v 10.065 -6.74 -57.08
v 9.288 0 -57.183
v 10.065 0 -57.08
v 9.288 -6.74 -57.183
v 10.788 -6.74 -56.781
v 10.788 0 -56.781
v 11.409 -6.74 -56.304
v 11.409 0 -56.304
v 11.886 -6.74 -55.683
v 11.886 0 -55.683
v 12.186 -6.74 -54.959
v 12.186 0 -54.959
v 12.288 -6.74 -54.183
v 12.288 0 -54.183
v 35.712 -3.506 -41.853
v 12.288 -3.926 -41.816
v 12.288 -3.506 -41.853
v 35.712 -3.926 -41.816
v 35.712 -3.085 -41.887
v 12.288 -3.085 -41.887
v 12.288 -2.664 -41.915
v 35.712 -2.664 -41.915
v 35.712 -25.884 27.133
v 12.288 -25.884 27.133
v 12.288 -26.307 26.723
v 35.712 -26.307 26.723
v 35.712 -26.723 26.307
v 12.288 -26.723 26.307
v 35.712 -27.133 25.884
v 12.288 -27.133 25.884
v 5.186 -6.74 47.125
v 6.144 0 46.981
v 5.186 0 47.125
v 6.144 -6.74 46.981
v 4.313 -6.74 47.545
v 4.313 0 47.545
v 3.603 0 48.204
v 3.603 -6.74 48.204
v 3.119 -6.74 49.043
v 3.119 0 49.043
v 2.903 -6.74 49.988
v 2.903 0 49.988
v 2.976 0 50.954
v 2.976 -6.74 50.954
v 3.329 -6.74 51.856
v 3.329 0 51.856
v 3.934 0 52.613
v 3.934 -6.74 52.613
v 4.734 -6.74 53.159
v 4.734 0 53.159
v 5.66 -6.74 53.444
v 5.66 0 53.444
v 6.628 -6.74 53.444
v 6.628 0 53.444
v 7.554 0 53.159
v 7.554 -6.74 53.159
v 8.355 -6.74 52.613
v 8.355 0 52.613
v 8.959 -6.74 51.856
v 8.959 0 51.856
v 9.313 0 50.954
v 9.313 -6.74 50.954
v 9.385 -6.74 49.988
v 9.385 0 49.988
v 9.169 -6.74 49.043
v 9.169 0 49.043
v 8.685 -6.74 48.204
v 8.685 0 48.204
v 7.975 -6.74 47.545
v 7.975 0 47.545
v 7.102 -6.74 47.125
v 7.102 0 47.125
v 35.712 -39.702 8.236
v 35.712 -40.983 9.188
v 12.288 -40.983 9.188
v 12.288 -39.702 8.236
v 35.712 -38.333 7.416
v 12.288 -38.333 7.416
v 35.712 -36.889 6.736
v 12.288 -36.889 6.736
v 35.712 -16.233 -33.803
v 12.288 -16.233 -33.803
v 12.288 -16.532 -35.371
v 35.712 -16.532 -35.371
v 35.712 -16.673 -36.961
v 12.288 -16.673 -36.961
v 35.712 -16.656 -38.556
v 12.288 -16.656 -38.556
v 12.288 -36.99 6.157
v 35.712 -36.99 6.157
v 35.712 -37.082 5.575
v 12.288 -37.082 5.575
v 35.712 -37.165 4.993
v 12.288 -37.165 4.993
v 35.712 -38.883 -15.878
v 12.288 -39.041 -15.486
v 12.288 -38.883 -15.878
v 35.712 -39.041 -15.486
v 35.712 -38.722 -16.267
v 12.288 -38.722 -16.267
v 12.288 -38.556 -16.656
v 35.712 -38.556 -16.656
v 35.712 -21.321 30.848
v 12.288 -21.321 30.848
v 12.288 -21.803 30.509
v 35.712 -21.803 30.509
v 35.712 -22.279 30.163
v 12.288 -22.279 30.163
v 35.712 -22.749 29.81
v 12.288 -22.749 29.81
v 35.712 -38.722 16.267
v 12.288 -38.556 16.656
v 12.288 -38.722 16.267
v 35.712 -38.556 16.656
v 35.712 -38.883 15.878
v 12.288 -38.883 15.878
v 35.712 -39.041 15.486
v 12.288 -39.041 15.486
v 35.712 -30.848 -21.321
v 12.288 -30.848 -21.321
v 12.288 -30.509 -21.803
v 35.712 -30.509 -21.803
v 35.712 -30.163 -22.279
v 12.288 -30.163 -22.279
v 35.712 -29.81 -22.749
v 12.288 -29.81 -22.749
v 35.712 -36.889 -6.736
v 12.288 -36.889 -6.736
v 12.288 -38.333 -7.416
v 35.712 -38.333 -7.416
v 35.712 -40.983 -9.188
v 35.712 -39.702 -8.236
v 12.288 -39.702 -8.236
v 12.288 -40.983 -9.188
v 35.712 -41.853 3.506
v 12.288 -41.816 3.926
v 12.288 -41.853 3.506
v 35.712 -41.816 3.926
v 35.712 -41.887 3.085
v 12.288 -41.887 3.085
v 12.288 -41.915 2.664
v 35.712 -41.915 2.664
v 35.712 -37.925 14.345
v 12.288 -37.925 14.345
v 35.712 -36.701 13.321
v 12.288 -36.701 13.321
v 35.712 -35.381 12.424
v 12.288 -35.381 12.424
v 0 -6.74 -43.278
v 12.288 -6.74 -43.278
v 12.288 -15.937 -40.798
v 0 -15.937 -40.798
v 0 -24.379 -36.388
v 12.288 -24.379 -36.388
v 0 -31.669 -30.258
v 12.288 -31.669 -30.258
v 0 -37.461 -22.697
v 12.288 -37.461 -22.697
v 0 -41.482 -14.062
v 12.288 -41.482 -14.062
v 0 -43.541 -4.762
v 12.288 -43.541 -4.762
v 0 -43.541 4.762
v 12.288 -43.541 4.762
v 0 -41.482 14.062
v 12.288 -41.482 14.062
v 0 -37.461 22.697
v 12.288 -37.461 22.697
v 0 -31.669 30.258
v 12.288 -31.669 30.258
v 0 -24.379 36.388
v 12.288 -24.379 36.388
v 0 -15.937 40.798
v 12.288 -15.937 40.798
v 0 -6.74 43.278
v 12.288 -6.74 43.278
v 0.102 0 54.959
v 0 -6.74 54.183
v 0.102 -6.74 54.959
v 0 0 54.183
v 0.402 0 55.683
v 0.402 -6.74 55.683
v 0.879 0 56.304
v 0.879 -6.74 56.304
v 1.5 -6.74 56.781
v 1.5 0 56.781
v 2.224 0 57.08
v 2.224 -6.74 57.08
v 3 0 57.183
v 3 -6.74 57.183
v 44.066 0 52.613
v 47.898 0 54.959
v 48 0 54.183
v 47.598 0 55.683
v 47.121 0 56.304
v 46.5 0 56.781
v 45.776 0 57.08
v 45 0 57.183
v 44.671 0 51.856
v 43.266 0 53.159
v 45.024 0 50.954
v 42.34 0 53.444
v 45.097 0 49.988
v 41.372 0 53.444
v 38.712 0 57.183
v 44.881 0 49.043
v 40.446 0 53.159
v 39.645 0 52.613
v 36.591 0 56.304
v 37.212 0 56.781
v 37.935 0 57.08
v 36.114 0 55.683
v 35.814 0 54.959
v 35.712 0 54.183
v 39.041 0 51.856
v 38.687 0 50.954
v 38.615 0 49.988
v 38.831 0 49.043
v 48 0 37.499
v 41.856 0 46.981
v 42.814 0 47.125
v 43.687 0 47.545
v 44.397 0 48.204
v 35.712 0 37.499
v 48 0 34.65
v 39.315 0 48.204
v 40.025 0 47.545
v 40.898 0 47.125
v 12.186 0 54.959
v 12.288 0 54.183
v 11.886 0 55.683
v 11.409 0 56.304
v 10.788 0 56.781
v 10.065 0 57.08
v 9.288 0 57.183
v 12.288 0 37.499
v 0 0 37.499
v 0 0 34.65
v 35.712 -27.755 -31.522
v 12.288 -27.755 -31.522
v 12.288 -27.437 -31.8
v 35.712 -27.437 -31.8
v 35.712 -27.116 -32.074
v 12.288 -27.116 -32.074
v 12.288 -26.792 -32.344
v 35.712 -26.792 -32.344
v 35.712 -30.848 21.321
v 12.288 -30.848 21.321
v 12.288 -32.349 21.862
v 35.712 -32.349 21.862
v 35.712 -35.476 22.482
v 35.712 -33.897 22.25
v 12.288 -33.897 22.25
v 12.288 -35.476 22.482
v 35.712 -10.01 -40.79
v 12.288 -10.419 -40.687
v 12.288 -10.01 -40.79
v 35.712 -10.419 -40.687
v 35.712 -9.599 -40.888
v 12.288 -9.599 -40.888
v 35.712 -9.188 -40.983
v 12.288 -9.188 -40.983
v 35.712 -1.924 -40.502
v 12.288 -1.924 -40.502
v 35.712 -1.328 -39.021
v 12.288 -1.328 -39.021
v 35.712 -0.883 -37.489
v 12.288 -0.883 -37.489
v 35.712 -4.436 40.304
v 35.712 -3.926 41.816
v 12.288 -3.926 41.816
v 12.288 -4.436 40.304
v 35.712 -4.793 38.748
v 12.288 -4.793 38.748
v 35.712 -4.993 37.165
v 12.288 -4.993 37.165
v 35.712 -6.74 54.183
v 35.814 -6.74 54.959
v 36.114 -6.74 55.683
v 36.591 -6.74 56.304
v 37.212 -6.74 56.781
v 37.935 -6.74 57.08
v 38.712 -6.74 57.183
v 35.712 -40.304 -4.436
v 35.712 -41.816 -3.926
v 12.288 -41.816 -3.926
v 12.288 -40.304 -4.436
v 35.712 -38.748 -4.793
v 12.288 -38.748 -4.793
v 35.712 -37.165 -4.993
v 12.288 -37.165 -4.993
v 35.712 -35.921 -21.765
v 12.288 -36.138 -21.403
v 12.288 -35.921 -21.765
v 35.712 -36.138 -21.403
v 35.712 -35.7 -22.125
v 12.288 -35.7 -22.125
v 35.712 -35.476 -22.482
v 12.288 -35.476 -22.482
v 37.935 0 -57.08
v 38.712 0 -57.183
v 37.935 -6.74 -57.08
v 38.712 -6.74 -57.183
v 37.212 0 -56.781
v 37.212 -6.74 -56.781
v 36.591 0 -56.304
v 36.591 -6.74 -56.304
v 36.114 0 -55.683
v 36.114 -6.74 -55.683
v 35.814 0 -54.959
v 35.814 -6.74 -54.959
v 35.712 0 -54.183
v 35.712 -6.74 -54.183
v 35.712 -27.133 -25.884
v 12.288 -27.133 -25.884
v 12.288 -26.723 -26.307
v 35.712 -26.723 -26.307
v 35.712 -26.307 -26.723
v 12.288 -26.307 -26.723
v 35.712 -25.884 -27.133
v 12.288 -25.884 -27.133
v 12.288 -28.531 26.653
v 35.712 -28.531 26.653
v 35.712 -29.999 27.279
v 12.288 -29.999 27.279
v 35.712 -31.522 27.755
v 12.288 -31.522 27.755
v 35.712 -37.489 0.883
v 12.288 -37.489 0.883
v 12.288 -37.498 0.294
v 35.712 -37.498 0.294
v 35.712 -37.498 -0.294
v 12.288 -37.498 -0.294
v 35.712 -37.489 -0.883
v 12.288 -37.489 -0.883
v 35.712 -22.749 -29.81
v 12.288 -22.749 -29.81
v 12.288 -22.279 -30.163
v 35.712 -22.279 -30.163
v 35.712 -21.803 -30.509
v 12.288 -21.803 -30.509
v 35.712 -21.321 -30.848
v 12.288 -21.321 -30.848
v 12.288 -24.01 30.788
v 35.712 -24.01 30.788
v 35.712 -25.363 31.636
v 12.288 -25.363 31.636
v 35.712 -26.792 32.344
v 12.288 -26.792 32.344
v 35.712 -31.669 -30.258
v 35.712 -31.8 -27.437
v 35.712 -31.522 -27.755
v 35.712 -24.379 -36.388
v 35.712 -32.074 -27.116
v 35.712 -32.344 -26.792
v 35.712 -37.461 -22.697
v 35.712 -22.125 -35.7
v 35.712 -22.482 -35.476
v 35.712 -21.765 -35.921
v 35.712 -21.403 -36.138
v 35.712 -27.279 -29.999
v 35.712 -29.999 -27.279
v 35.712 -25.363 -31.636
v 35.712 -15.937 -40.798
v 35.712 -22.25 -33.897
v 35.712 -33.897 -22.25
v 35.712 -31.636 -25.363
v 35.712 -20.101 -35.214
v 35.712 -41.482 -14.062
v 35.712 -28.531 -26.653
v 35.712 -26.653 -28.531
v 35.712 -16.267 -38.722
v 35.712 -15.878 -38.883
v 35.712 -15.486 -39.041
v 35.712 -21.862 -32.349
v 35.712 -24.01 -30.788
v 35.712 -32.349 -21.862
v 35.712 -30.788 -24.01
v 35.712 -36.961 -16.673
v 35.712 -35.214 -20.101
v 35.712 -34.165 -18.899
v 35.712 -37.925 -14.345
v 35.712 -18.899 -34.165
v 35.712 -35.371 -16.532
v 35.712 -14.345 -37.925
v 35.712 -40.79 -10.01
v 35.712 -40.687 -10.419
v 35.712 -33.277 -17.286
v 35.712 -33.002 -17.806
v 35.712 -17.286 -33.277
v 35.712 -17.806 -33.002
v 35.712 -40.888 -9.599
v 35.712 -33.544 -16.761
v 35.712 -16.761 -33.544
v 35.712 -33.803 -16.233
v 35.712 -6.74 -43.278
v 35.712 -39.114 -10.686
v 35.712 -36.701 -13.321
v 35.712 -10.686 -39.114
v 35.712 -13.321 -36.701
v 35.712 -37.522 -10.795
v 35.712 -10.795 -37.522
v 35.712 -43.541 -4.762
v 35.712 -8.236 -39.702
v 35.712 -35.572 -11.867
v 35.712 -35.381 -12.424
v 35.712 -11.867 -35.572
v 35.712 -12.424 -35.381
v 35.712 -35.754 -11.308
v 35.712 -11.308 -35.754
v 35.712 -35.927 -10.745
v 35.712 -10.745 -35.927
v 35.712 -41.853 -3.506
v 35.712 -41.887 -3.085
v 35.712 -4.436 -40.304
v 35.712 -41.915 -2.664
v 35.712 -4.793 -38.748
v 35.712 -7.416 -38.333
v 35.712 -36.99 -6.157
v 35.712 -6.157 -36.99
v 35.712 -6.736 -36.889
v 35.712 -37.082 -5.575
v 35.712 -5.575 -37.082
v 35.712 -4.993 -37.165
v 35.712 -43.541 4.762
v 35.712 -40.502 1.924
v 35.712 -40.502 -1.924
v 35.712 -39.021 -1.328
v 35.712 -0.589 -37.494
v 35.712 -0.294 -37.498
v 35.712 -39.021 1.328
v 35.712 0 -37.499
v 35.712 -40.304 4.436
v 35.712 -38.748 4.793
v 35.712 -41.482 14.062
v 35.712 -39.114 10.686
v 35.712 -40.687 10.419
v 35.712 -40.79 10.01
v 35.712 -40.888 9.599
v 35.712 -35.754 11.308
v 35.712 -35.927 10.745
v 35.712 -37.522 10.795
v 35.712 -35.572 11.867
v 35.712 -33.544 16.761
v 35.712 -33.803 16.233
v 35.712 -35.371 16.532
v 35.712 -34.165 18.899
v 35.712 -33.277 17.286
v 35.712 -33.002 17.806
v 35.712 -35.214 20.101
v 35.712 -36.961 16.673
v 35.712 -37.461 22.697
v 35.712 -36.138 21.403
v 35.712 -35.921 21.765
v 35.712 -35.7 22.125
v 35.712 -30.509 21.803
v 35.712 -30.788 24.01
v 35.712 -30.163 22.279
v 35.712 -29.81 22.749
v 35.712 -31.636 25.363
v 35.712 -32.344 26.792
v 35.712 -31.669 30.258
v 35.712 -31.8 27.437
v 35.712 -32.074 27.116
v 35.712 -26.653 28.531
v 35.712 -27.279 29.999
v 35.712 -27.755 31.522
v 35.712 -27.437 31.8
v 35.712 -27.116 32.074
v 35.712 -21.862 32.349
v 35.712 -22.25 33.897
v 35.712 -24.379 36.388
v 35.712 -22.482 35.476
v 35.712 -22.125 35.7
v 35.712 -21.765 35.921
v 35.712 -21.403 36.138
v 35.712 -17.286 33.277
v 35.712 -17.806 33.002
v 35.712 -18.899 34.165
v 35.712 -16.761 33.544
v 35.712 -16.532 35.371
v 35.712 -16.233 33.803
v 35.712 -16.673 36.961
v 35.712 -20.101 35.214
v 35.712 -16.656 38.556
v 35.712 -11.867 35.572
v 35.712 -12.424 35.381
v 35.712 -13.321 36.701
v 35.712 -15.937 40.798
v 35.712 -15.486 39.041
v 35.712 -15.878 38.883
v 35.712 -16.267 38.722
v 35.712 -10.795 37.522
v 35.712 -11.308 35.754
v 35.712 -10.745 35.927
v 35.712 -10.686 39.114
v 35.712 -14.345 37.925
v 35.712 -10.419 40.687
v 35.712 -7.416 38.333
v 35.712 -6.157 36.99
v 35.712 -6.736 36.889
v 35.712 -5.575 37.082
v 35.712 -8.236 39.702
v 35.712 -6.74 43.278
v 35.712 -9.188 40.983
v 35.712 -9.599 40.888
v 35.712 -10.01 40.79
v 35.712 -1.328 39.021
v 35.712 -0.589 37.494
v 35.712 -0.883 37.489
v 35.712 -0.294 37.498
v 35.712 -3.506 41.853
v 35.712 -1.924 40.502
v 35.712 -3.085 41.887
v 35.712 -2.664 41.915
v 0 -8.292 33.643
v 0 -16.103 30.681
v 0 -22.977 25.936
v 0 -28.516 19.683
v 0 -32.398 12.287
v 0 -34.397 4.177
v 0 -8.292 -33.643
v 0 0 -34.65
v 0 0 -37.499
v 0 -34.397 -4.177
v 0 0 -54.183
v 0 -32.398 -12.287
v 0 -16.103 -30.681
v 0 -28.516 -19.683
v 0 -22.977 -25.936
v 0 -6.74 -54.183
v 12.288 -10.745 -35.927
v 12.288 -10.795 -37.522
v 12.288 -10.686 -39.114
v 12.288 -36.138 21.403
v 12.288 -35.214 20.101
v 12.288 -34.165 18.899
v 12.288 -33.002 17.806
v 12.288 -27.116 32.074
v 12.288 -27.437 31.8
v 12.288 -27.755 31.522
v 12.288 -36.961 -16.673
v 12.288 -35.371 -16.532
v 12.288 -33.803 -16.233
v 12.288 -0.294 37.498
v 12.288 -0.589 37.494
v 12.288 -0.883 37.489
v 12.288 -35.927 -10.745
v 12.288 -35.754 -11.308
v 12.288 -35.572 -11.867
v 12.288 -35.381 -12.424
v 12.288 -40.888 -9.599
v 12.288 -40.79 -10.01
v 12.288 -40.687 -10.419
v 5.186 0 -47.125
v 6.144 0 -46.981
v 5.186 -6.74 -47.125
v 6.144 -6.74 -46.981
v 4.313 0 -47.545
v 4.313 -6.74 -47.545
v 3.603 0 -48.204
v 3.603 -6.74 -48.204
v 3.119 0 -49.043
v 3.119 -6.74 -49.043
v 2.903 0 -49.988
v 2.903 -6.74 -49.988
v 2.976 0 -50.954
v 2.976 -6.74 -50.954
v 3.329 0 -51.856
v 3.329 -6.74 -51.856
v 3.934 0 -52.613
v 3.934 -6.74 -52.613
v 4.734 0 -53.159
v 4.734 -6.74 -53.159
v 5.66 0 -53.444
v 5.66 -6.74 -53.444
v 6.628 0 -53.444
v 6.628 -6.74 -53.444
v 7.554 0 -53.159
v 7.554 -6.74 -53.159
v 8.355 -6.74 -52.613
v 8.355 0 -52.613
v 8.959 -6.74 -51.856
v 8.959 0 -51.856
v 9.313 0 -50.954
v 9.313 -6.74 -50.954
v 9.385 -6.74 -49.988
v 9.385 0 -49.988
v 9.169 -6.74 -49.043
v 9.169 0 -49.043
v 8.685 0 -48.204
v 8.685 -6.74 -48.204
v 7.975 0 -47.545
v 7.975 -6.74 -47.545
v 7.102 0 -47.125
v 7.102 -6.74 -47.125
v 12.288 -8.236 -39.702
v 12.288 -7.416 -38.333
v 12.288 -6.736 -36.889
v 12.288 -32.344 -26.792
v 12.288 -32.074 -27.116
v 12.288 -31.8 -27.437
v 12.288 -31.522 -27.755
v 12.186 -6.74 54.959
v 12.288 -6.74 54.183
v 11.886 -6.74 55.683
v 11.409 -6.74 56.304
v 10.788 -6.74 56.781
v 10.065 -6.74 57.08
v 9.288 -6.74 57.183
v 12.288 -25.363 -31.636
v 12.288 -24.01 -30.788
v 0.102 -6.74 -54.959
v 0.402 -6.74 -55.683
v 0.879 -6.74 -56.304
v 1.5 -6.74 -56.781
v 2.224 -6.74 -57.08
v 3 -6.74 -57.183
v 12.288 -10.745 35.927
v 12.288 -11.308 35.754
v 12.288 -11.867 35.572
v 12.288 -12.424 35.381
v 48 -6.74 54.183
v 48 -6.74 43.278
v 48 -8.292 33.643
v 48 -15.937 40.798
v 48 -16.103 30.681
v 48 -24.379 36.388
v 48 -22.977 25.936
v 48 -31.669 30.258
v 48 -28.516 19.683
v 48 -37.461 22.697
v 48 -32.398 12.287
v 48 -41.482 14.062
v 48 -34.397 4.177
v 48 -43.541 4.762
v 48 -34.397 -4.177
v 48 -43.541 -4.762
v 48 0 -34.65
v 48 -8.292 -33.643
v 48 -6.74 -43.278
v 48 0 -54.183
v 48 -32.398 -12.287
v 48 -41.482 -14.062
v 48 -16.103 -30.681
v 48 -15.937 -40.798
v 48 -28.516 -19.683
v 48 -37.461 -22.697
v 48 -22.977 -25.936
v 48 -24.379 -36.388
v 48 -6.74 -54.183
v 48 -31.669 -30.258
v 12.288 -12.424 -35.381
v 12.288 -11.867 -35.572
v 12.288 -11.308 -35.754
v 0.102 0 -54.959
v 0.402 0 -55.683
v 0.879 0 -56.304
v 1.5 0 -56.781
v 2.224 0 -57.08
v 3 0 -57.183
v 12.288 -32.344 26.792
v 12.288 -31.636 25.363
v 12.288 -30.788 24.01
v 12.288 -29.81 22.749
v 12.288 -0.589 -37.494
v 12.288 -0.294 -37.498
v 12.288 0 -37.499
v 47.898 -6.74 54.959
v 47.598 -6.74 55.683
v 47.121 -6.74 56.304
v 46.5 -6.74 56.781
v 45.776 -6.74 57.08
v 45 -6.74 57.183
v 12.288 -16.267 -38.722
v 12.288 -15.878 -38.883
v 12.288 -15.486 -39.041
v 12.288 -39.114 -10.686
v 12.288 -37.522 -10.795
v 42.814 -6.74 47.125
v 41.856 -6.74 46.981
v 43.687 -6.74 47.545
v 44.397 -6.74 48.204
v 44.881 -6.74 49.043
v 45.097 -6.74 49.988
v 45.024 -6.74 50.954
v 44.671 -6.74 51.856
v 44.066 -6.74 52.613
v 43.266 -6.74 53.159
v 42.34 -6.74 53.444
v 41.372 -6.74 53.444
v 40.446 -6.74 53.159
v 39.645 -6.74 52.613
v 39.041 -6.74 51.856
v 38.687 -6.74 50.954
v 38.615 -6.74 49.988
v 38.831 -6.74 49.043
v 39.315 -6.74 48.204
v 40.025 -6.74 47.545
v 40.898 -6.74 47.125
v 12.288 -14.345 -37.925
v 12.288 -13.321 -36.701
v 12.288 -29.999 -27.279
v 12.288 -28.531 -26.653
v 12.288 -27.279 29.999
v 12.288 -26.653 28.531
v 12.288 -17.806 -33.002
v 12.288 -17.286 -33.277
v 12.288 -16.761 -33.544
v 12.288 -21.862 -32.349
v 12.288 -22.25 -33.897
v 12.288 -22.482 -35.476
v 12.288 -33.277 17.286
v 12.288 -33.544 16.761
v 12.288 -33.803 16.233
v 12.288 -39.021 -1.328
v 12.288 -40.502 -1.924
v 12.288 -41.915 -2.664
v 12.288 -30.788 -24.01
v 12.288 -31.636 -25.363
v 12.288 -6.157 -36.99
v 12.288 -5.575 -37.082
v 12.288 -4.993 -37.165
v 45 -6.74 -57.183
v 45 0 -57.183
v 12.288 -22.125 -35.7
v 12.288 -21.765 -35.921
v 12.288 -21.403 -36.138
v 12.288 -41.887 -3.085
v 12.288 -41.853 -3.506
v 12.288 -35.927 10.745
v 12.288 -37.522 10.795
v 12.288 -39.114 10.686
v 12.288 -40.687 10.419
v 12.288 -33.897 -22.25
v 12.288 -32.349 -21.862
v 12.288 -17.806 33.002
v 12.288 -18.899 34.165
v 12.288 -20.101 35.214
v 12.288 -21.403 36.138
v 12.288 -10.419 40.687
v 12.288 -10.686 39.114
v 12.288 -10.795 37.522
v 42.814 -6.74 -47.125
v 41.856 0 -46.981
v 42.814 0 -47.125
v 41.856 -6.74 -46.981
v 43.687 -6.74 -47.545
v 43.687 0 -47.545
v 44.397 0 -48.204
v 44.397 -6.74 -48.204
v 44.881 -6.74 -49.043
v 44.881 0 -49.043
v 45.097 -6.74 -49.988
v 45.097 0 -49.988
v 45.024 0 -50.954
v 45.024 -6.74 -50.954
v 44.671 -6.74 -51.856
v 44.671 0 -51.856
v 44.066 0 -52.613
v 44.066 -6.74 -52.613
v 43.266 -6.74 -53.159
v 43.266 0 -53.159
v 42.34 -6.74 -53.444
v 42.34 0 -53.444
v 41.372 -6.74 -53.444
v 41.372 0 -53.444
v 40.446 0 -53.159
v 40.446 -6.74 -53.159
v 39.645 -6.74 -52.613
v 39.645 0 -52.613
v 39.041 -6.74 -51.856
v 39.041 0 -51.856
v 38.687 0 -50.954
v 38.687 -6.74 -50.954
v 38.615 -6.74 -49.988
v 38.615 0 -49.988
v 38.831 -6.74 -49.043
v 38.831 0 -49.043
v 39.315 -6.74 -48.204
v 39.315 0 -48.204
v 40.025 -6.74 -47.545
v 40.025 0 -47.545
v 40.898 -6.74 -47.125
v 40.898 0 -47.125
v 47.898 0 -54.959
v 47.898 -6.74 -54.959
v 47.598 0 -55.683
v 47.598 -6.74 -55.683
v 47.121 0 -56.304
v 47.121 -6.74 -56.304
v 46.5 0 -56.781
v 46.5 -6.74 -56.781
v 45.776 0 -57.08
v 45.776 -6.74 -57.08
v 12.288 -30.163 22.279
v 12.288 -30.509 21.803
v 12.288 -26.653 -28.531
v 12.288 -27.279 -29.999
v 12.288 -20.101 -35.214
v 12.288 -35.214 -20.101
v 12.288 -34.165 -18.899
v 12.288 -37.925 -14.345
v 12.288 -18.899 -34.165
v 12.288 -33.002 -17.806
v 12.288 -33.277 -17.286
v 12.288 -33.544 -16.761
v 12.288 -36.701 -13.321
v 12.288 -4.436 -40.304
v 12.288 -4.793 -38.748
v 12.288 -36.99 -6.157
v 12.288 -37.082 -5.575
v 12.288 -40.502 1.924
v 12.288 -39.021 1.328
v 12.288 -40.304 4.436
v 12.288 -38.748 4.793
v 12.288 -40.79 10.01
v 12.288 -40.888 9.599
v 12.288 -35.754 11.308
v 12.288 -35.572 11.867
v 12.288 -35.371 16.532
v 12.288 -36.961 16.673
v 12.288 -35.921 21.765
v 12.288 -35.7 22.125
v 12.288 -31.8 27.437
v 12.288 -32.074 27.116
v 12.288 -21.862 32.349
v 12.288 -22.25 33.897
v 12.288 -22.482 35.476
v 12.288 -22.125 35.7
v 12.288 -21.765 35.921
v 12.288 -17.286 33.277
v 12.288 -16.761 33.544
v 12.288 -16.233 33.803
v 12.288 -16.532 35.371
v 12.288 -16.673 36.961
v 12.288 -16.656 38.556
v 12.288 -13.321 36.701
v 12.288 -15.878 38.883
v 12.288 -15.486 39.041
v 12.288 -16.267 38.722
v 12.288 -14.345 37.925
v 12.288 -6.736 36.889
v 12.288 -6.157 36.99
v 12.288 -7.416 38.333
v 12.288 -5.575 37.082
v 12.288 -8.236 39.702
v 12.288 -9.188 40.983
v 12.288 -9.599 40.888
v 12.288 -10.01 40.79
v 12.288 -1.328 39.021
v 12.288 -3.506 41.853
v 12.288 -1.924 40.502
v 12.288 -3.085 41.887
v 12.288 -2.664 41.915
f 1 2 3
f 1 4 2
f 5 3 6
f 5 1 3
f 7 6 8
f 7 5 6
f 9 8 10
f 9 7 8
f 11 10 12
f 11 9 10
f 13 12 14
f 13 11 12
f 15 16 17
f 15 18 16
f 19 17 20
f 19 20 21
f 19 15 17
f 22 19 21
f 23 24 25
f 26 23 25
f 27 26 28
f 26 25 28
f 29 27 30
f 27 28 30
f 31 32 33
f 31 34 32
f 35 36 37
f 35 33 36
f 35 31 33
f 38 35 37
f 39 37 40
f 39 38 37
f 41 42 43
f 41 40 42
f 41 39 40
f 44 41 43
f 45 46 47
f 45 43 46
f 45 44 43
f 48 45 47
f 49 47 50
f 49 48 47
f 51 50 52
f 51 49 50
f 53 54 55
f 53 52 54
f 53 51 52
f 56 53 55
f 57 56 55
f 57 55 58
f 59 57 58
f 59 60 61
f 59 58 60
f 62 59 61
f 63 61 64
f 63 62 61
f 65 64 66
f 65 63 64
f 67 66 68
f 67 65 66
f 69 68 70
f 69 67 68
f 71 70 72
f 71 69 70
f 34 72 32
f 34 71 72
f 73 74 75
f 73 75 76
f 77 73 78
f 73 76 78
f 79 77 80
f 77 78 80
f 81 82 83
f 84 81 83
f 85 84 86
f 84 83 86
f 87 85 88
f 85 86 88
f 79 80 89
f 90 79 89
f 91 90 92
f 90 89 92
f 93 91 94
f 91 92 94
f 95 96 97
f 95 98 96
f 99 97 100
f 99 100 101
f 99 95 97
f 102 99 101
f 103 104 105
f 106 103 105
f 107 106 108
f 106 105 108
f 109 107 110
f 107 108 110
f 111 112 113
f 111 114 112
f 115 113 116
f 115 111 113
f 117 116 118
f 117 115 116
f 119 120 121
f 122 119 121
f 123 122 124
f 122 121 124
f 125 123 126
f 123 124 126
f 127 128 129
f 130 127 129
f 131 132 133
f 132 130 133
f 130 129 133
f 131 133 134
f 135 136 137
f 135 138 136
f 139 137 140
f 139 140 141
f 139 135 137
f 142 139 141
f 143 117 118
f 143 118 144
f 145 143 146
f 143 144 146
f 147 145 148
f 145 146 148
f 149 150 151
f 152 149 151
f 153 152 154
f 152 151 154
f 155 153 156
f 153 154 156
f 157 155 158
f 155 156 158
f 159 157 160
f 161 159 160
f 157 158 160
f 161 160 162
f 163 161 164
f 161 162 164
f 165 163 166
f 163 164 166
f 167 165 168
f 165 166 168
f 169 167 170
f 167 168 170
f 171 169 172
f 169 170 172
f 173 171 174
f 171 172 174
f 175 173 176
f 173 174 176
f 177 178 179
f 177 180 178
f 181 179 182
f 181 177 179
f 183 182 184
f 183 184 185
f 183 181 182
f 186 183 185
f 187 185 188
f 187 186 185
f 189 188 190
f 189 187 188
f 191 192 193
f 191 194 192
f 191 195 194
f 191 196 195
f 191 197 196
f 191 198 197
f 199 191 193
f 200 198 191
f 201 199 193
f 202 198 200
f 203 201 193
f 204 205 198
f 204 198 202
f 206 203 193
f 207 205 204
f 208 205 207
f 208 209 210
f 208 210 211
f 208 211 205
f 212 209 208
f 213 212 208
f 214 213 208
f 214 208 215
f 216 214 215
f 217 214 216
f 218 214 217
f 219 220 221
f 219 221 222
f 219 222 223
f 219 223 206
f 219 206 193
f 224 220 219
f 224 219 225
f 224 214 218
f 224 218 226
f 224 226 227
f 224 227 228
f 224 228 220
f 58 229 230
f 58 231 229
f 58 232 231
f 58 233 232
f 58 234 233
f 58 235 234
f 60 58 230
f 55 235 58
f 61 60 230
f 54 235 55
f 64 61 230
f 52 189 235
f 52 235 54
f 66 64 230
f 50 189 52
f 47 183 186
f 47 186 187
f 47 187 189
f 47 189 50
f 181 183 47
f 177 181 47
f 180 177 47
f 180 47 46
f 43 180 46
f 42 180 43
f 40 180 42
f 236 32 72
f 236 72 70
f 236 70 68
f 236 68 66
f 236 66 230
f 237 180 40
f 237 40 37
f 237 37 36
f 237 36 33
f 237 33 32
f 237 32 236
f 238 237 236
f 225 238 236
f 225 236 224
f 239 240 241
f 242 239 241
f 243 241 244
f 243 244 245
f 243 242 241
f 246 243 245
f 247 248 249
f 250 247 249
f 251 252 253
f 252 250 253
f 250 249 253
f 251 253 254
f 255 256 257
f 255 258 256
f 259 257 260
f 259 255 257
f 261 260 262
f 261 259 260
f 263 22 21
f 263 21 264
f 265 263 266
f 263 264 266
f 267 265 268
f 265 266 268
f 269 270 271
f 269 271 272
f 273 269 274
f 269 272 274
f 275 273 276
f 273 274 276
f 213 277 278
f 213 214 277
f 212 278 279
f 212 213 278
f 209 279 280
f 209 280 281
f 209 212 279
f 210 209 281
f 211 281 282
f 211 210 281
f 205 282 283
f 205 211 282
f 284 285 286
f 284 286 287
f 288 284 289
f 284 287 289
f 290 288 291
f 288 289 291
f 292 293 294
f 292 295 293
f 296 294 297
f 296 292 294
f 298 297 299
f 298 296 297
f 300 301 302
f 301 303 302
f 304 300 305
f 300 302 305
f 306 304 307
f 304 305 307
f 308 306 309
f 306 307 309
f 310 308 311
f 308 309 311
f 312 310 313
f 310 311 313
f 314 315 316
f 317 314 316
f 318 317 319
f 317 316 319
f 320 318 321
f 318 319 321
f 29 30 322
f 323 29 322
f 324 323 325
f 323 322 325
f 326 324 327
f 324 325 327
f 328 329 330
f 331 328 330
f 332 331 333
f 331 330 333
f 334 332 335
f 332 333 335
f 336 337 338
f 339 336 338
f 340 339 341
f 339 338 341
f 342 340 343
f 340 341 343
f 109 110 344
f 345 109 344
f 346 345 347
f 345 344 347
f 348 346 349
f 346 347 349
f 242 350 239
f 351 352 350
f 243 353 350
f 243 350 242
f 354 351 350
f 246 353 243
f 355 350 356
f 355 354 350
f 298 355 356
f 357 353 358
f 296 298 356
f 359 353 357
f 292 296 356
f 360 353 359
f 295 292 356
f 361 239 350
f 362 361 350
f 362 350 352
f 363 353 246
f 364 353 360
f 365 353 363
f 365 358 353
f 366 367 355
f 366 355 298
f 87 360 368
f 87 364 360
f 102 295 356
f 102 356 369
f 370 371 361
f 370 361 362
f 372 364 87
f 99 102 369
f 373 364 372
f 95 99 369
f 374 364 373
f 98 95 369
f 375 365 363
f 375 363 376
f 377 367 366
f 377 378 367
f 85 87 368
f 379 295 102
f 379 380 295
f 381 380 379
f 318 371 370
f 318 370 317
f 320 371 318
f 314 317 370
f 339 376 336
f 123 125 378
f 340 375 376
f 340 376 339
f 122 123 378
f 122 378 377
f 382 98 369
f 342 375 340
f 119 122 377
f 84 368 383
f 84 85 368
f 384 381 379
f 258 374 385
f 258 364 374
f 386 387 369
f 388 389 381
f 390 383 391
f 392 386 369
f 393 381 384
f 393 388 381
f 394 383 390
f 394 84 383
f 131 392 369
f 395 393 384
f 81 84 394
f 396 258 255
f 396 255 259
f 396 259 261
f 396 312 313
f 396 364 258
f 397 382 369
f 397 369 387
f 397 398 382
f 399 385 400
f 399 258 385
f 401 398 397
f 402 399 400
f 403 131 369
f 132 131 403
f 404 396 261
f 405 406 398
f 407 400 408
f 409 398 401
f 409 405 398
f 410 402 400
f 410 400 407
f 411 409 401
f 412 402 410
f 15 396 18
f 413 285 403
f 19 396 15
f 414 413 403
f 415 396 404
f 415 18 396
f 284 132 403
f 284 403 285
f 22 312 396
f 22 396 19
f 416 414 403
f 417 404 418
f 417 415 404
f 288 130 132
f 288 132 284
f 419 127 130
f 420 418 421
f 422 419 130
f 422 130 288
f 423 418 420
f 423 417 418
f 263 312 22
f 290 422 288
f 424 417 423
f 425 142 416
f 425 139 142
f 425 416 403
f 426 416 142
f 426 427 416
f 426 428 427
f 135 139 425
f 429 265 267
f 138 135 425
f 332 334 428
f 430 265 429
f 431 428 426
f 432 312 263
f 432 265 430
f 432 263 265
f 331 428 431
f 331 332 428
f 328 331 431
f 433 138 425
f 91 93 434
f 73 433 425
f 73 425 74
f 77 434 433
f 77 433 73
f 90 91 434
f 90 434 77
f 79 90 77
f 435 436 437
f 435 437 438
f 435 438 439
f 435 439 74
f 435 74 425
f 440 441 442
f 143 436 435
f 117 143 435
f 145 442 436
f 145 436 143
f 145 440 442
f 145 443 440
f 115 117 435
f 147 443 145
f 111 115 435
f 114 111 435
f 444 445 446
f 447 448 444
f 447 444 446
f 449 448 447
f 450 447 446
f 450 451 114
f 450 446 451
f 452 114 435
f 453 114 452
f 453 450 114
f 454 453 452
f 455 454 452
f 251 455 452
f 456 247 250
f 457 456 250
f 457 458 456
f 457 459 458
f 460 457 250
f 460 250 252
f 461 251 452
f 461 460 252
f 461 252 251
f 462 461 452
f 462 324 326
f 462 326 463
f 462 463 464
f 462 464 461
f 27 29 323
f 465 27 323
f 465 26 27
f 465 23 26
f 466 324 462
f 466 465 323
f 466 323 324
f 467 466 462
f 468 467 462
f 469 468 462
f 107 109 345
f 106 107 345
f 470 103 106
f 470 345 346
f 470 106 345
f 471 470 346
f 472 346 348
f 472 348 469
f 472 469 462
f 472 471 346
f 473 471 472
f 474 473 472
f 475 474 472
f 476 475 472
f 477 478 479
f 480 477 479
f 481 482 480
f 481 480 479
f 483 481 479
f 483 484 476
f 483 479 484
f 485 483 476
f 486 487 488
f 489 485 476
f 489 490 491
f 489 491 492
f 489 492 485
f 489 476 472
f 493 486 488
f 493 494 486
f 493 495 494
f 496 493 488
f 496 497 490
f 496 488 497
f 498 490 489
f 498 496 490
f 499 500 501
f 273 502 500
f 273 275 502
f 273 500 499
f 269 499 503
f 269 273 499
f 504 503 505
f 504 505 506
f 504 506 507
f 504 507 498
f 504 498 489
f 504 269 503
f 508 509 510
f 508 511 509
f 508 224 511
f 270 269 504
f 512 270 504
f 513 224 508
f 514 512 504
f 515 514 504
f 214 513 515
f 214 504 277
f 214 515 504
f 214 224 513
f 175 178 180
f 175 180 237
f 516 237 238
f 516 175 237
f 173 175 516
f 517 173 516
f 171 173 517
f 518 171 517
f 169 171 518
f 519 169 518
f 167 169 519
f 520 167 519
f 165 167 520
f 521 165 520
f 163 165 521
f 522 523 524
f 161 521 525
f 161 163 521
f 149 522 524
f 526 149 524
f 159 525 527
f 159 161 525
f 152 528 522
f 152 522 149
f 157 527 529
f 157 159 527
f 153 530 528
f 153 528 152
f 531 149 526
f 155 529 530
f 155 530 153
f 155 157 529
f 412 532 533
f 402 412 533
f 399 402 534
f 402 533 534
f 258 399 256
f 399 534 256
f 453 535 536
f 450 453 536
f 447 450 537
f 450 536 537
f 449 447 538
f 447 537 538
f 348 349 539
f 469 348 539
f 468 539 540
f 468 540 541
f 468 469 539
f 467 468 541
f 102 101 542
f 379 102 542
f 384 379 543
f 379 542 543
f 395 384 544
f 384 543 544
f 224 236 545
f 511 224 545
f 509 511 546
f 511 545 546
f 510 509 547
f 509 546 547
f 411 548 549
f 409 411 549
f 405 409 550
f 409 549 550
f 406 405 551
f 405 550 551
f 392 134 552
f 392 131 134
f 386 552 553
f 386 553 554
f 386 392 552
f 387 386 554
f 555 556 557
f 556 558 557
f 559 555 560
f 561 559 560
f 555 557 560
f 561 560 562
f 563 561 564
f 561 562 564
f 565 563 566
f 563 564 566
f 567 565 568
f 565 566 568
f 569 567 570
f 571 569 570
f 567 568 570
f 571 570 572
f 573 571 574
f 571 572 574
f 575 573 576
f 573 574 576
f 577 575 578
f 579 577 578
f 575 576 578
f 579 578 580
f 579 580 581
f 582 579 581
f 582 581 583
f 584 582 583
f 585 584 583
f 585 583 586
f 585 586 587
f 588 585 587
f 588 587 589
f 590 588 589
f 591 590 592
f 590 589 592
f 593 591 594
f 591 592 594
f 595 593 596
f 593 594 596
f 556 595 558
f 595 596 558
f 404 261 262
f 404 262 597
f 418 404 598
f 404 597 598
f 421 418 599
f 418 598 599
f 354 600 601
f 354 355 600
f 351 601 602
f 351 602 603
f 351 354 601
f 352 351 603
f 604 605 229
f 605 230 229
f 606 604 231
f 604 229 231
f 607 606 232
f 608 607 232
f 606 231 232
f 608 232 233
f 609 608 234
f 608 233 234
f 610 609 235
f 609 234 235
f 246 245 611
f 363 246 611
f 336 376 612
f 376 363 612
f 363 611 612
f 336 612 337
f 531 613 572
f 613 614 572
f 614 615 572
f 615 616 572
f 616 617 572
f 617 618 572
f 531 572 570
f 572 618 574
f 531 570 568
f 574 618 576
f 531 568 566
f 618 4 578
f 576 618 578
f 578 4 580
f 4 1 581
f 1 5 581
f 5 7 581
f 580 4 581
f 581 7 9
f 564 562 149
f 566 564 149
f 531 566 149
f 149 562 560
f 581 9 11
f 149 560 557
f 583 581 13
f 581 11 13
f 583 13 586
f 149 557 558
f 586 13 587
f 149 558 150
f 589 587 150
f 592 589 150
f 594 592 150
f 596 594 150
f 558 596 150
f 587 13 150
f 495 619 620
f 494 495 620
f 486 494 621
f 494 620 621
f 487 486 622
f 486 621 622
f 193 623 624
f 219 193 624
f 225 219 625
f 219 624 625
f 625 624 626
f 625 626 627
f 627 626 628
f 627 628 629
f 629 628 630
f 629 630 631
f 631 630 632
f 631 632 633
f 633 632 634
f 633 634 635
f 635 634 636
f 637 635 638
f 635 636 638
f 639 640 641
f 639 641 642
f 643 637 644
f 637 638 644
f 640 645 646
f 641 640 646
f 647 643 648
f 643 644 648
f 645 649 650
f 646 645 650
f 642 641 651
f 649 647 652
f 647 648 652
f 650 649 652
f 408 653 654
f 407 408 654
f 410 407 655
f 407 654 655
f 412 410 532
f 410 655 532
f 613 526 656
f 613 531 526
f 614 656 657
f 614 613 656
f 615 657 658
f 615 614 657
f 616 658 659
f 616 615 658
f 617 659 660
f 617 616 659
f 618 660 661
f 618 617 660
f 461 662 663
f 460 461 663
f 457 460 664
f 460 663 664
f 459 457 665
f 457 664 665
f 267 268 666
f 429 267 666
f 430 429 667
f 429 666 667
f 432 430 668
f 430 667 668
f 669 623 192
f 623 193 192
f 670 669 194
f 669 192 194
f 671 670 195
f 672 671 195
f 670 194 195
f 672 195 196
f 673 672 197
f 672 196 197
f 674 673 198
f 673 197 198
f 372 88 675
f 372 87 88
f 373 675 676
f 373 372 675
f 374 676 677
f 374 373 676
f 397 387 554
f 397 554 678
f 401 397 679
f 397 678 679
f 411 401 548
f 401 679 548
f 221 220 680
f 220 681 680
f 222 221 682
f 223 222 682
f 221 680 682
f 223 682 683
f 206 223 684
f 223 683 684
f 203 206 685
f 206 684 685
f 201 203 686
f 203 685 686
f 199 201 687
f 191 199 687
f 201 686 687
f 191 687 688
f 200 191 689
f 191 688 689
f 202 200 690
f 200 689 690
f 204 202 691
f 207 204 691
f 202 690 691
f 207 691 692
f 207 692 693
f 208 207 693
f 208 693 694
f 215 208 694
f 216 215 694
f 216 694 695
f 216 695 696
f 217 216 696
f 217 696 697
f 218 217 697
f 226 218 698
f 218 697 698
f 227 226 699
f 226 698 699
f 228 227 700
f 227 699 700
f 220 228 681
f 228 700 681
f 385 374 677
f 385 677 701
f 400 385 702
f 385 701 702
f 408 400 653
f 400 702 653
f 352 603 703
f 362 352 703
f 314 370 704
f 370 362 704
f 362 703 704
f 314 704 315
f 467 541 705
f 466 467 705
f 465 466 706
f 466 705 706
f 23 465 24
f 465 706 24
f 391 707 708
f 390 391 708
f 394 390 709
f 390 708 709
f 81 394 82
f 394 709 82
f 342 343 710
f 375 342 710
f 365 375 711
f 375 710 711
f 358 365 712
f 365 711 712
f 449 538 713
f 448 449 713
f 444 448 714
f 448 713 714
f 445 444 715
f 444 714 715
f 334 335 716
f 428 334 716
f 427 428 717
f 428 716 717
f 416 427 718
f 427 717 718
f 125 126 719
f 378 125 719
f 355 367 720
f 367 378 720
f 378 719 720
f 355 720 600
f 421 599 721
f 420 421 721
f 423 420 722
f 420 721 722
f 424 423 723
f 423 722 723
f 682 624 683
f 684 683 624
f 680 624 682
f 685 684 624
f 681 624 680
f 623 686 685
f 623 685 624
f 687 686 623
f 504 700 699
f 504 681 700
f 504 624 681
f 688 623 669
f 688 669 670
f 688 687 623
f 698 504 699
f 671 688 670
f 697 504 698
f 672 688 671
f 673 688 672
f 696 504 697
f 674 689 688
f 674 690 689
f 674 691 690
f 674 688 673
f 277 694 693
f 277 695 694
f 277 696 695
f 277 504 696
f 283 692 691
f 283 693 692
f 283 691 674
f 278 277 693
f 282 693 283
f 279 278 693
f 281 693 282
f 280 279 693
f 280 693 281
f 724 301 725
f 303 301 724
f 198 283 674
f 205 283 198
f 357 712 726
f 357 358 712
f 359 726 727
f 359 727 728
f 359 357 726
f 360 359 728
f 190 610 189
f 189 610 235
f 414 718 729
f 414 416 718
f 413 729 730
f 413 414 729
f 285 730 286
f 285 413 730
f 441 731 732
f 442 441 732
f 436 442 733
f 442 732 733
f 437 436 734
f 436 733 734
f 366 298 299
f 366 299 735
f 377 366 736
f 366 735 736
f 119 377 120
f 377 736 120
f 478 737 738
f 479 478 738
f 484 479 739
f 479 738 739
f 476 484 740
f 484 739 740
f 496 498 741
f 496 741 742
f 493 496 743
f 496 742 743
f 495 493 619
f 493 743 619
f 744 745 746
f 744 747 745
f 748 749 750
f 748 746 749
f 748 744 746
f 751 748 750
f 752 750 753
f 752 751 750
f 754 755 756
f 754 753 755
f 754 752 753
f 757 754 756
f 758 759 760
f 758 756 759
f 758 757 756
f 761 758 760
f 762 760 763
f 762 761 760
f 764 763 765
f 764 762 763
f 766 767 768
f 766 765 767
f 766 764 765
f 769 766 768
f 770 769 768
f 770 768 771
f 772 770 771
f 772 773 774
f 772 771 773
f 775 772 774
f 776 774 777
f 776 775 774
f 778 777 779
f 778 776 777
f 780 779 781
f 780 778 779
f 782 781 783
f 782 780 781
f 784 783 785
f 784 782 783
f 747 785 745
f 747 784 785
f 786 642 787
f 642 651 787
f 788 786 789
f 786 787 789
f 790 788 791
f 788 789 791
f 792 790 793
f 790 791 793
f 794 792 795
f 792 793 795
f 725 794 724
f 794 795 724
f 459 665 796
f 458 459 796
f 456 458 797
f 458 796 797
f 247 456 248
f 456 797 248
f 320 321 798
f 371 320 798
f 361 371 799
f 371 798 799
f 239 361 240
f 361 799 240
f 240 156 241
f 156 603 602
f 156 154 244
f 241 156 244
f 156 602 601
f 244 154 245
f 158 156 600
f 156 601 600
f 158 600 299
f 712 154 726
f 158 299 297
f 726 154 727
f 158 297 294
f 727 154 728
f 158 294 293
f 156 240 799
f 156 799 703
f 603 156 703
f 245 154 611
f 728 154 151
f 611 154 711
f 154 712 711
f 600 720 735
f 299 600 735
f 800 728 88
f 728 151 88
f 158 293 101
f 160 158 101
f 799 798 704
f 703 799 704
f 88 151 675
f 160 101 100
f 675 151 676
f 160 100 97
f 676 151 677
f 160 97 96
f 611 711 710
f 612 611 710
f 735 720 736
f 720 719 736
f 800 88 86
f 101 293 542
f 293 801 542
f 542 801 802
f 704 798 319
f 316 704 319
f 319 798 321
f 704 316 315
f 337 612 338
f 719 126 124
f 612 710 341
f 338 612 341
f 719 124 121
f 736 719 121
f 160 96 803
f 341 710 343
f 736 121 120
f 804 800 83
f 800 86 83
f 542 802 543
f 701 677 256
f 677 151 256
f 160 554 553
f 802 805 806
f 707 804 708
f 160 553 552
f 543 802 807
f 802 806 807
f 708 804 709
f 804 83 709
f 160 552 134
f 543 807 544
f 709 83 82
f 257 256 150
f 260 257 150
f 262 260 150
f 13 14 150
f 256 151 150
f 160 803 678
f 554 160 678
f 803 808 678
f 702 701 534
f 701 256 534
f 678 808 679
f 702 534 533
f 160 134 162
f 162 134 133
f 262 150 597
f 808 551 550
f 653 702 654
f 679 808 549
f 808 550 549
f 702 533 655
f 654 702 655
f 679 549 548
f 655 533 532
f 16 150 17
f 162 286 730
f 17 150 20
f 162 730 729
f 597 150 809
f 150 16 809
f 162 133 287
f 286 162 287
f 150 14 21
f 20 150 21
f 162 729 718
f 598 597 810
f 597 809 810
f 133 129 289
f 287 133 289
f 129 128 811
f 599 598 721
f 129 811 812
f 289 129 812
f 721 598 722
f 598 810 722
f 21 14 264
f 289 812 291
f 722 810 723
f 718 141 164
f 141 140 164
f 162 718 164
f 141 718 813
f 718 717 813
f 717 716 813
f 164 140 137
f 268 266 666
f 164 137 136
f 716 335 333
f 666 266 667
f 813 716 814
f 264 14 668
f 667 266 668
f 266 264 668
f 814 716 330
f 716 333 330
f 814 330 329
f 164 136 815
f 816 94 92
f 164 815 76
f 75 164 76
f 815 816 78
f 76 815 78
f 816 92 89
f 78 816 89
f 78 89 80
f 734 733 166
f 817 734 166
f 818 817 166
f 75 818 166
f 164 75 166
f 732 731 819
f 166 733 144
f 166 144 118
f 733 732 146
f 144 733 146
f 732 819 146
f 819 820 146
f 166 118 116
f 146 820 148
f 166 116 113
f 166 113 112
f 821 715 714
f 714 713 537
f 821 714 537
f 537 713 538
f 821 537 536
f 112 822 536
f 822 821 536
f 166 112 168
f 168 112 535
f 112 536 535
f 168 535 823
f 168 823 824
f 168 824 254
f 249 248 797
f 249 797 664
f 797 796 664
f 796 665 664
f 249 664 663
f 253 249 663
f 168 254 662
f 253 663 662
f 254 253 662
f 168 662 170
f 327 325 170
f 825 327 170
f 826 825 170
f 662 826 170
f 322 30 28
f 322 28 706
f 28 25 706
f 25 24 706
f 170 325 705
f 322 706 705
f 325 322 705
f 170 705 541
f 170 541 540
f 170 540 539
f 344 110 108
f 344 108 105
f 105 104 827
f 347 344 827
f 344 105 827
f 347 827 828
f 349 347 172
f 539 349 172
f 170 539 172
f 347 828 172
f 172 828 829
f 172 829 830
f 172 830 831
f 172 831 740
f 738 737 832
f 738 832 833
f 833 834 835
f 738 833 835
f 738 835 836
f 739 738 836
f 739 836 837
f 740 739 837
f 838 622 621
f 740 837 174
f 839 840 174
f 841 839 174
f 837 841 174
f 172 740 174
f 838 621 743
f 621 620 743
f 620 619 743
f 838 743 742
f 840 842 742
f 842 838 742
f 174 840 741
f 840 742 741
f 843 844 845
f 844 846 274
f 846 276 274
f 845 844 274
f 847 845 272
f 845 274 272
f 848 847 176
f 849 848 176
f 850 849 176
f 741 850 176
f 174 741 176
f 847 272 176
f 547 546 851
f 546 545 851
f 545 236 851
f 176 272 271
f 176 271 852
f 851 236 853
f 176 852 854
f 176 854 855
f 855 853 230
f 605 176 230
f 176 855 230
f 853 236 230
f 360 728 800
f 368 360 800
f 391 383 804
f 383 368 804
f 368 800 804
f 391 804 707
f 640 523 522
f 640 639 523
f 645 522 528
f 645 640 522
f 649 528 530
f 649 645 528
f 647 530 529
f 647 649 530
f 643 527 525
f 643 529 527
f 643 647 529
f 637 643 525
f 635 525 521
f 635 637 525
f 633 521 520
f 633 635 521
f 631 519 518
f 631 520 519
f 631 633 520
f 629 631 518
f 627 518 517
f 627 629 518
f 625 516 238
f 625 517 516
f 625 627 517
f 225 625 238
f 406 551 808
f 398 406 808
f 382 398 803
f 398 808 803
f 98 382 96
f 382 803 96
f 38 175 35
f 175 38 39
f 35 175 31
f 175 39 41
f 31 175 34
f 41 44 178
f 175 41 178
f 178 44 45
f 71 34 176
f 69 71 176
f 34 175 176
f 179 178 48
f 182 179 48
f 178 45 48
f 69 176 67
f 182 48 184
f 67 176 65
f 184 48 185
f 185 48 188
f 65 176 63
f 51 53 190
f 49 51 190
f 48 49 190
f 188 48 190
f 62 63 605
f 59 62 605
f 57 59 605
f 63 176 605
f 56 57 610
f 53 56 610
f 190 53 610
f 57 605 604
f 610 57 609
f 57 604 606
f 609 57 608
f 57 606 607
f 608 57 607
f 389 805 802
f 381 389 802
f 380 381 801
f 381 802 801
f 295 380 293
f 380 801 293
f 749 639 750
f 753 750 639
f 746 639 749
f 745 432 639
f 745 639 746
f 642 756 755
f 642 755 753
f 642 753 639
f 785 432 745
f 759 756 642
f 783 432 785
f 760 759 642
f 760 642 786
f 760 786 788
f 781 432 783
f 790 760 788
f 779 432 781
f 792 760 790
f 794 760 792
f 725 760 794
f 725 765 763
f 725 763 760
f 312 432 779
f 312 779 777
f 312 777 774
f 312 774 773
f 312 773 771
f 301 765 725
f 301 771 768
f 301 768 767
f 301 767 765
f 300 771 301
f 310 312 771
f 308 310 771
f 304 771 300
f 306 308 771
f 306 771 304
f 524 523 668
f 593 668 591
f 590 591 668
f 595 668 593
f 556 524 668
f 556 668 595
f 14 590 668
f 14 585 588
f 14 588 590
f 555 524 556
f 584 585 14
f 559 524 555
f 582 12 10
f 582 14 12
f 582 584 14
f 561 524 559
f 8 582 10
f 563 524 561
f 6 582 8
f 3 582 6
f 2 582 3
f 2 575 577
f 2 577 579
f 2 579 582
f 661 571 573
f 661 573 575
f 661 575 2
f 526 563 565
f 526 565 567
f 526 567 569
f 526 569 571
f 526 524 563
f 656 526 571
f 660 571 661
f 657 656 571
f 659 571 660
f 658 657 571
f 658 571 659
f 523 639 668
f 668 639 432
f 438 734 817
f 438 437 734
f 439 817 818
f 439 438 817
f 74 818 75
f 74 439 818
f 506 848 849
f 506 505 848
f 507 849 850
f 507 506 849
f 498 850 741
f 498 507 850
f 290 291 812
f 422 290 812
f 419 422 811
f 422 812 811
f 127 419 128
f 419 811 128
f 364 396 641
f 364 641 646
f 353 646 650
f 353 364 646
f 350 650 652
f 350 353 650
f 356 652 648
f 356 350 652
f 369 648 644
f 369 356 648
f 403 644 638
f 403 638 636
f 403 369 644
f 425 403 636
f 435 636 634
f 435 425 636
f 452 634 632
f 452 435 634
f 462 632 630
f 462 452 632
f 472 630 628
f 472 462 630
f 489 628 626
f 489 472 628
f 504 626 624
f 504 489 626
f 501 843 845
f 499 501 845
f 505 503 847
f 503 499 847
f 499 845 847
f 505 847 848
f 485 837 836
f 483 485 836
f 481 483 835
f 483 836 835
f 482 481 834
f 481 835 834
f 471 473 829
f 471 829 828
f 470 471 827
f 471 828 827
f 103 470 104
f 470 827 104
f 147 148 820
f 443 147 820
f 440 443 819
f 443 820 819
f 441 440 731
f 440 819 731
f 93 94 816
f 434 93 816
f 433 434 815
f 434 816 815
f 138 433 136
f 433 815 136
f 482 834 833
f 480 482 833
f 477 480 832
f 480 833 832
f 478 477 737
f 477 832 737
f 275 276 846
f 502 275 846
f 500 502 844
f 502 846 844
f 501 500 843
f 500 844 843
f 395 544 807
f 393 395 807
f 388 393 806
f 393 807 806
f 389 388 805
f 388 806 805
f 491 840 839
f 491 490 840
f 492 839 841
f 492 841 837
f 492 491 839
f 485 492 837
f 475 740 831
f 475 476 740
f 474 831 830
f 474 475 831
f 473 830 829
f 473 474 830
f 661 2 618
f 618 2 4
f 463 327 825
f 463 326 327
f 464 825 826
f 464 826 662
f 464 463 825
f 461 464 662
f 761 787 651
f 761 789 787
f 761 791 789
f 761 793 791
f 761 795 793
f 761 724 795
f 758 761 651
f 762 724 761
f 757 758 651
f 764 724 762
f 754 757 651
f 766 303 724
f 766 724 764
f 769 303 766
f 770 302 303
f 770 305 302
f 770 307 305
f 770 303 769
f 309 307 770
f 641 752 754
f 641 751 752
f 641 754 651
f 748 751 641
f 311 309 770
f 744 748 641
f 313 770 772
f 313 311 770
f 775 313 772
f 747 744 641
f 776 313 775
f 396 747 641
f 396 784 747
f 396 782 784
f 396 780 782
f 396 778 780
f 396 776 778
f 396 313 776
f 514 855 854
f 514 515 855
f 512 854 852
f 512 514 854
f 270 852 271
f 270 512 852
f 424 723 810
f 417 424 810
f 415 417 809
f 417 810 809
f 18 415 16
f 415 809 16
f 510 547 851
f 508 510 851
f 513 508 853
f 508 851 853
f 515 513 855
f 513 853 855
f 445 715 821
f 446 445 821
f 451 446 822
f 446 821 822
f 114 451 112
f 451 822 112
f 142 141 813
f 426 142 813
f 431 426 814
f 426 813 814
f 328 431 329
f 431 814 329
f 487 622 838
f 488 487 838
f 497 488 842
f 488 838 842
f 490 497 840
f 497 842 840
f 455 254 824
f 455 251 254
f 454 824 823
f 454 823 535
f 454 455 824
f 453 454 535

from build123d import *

# Parameters (mm, degrees)
BASPROSKE_W             = 48
BASPROSKE_H             = 42
TOOTHCUT_DEPTH          = 77.367532368
TEETHCUTS_COUNT         = 40
TEETHCUTS_ANGLE         = 351
BORSKE_R                = 32.5
BORE_DEPTH              = 50.0000508
CUT_EXTRUDE1_DEPTH      = 77.274548253
CUT_EXTRUDE1_DEPTH_BACK = 77.274548253
SKETCH1_R               = 34.65
CUT_EXTRUDE2_DEPTH      = 77.274548253
CUT_EXTRUDE2_DEPTH_BACK = 77.274548253
SKETCH2_W               = 102.897600885
SKETCH2_H               = 48.377080865
BOSS_EXTRUDE1_START     = -12.28816495
BOSS_EXTRUDE1_DEPTH     = 12.28816495
SKETCH4_R               = 3.25
CUT_EXTRUDE3_DEPTH      = 84.350383201
MIRROR3_COPY_1_SKETCH_R = 3.25
MIRROR3_COPY_1_DEPTH    = 84.350383201
FILLET1_R               = 3


with BuildPart() as part:
    # BasProSke → Base-Revolve (revolve)
    with BuildSketch(Plane(origin=(0, 0, 0), x_dir=(1, 0, 0), z_dir=(0, 1, 0)), mode=Mode.PRIVATE) as base_revolve_sk:
        with Locations((24, 21)):
            Rectangle(BASPROSKE_W, BASPROSKE_H)
    revolve(base_revolve_sk.sketch.rotate(Axis((-10, 0, 0), (1, 0, 0)), 180), axis=Axis((-10, 0, 0), (1, 0, 0)))

    # TooCutSke → ToothCut (cut, through all)
    with BuildSketch(Plane(origin=(0, 0, 0), x_dir=(0, 0, -1), z_dir=(1, 0, 0))):
        with BuildLine():
            ThreePointArc((0.882812088, 37.488606854), (0, 37.499), (-0.882812088, 37.488606854))
            ThreePointArc((-0.882812088, 37.488606854), (-1.612748684, 39.782000434), (-2.678427154, 41.939960338))
            ThreePointArc((-2.678427154, 41.939960338), (0, 42.0254), (2.678427154, 41.939960338))
            ThreePointArc((2.678427154, 41.939960338), (1.612748684, 39.782000434), (0.882812088, 37.488606854))
        make_face()
    toothcut = extrude(amount=TOOTHCUT_DEPTH, mode=Mode.SUBTRACT)

    # TeethCuts: ToothCut ×40 about axis
    teethcuts_axis = Axis((-10, 0, 0), (1, 0, 0))
    for i in range(1, TEETHCUTS_COUNT):
        add(toothcut.rotate(teethcuts_axis, i * TEETHCUTS_ANGLE / (TEETHCUTS_COUNT - 1)), mode=Mode.SUBTRACT)

    # BorSke → Bore (cut, symmetric)
    with BuildSketch(Plane(origin=(0, 0, 0), x_dir=(0, 0, -1), z_dir=(1, 0, 0))):
        with Locations(Location((0, 0, 0), (0, 0, 180))):
            Circle(BORSKE_R)
    extrude(amount=BORE_DEPTH, both=True, mode=Mode.SUBTRACT)

    # Sketch1 → Cut-Extrude1 (cut, two sides: drawn at the far end of the back side and taken through both)
    with BuildSketch(Plane.ZY.offset(-CUT_EXTRUDE1_DEPTH_BACK)):
        Circle(SKETCH1_R)
    extrude(amount=CUT_EXTRUDE1_DEPTH + CUT_EXTRUDE1_DEPTH_BACK, mode=Mode.SUBTRACT)

    # Sketch2 → Cut-Extrude2 (cut, two sides: drawn at the far end of the back side and taken through both)
    with BuildSketch(Plane(origin=(48, 0, 0), x_dir=(0, 0, -1), z_dir=(1, 0, 0)).offset(-CUT_EXTRUDE2_DEPTH_BACK)):
        with Locations((0.168316686, 24.188540433)):
            Rectangle(SKETCH2_W, SKETCH2_H)
    extrude(amount=CUT_EXTRUDE2_DEPTH + CUT_EXTRUDE2_DEPTH_BACK, mode=Mode.SUBTRACT)

    # Sketch3 → Boss-Extrude1 (add)
    with BuildSketch(Plane(origin=(48, 0, 0), x_dir=(0, 0, -1), z_dir=(1, 0, 0)).offset(BOSS_EXTRUDE1_START)):
        with BuildLine():
            Line((34.65, 0), (57.182596138, 0))
            Line((57.182596138, 0), (57.182596138, -6.740320101))
            Line((57.182596138, -6.740320101), (43.278498338, -6.740320101))
            ThreePointArc((43.278498338, -6.740320101), (0, -43.800232116), (-43.278498338, -6.740320101))
            Line((-43.278498338, -6.740320101), (-57.182596138, -6.740320101))
            Line((-57.182596138, -6.740320101), (-57.182596138, 0))
            Line((-57.182596138, 0), (-34.65, 0))
            ThreePointArc((-34.65, 0), (0, -34.65), (34.65, 0))
        make_face()
    boss_extrude1 = extrude(amount=BOSS_EXTRUDE1_DEPTH)

    # Mirror1: Boss-Extrude1 across plane
    add(boss_extrude1.mirror(Plane(origin=(24, 0, 0), x_dir=(0, 0, 1), z_dir=(1, 0, 0))))

    # Sketch4 → Cut-Extrude3 (cut, symmetric)
    with BuildSketch(Plane.XZ.offset(6.740320101)):
        with Locations(Location((41.855917525, 50.230547238, 0), (0, 0, 270))):
            Circle(SKETCH4_R)
    cut_extrude3 = extrude(amount=CUT_EXTRUDE3_DEPTH, both=True, mode=Mode.SUBTRACT)

    # Mirror2: Cut-Extrude3 across plane
    add(cut_extrude3.mirror(Plane.XY), mode=Mode.SUBTRACT)

    # Mirror3: Cut-Extrude3 across plane
    add(cut_extrude3.mirror(Plane(origin=(24, 0, 0), x_dir=(0, 0, 1), z_dir=(1, 0, 0))), mode=Mode.SUBTRACT)

    # Mirror3 copy 1 sketch → Mirror3 copy 1 (cut, symmetric)
    with BuildSketch(Plane(origin=(48, -6.740320101, 0), x_dir=(-1, 0, 0), z_dir=(0, -1, 0))):
        with Locations(Location((41.855917525, 50.230547238, 0), (0, 0, 270))):
            Circle(MIRROR3_COPY_1_SKETCH_R)
    extrude(amount=MIRROR3_COPY_1_DEPTH, both=True, mode=Mode.SUBTRACT)

    # Fillet1
    fillet1_edges = [part.edges().sort_by_distance(p)[0] for p in [
        (0, -3.37016005, -57.182596138),
        (0, -3.37016005, 57.182596138),
        (12.28816495, -3.37016005, 57.182596138),
        (12.28816495, -3.37016005, -57.182596138),
        (35.71183505, -3.37016005, -57.182596138),
        (35.71183505, -3.37016005, 57.182596138),
        (48, -3.37016005, 57.182596138),
        (48, -3.37016005, -57.182596138),
    ]]
    fillet(fillet1_edges, radius=FILLET1_R)


solid = part.part
